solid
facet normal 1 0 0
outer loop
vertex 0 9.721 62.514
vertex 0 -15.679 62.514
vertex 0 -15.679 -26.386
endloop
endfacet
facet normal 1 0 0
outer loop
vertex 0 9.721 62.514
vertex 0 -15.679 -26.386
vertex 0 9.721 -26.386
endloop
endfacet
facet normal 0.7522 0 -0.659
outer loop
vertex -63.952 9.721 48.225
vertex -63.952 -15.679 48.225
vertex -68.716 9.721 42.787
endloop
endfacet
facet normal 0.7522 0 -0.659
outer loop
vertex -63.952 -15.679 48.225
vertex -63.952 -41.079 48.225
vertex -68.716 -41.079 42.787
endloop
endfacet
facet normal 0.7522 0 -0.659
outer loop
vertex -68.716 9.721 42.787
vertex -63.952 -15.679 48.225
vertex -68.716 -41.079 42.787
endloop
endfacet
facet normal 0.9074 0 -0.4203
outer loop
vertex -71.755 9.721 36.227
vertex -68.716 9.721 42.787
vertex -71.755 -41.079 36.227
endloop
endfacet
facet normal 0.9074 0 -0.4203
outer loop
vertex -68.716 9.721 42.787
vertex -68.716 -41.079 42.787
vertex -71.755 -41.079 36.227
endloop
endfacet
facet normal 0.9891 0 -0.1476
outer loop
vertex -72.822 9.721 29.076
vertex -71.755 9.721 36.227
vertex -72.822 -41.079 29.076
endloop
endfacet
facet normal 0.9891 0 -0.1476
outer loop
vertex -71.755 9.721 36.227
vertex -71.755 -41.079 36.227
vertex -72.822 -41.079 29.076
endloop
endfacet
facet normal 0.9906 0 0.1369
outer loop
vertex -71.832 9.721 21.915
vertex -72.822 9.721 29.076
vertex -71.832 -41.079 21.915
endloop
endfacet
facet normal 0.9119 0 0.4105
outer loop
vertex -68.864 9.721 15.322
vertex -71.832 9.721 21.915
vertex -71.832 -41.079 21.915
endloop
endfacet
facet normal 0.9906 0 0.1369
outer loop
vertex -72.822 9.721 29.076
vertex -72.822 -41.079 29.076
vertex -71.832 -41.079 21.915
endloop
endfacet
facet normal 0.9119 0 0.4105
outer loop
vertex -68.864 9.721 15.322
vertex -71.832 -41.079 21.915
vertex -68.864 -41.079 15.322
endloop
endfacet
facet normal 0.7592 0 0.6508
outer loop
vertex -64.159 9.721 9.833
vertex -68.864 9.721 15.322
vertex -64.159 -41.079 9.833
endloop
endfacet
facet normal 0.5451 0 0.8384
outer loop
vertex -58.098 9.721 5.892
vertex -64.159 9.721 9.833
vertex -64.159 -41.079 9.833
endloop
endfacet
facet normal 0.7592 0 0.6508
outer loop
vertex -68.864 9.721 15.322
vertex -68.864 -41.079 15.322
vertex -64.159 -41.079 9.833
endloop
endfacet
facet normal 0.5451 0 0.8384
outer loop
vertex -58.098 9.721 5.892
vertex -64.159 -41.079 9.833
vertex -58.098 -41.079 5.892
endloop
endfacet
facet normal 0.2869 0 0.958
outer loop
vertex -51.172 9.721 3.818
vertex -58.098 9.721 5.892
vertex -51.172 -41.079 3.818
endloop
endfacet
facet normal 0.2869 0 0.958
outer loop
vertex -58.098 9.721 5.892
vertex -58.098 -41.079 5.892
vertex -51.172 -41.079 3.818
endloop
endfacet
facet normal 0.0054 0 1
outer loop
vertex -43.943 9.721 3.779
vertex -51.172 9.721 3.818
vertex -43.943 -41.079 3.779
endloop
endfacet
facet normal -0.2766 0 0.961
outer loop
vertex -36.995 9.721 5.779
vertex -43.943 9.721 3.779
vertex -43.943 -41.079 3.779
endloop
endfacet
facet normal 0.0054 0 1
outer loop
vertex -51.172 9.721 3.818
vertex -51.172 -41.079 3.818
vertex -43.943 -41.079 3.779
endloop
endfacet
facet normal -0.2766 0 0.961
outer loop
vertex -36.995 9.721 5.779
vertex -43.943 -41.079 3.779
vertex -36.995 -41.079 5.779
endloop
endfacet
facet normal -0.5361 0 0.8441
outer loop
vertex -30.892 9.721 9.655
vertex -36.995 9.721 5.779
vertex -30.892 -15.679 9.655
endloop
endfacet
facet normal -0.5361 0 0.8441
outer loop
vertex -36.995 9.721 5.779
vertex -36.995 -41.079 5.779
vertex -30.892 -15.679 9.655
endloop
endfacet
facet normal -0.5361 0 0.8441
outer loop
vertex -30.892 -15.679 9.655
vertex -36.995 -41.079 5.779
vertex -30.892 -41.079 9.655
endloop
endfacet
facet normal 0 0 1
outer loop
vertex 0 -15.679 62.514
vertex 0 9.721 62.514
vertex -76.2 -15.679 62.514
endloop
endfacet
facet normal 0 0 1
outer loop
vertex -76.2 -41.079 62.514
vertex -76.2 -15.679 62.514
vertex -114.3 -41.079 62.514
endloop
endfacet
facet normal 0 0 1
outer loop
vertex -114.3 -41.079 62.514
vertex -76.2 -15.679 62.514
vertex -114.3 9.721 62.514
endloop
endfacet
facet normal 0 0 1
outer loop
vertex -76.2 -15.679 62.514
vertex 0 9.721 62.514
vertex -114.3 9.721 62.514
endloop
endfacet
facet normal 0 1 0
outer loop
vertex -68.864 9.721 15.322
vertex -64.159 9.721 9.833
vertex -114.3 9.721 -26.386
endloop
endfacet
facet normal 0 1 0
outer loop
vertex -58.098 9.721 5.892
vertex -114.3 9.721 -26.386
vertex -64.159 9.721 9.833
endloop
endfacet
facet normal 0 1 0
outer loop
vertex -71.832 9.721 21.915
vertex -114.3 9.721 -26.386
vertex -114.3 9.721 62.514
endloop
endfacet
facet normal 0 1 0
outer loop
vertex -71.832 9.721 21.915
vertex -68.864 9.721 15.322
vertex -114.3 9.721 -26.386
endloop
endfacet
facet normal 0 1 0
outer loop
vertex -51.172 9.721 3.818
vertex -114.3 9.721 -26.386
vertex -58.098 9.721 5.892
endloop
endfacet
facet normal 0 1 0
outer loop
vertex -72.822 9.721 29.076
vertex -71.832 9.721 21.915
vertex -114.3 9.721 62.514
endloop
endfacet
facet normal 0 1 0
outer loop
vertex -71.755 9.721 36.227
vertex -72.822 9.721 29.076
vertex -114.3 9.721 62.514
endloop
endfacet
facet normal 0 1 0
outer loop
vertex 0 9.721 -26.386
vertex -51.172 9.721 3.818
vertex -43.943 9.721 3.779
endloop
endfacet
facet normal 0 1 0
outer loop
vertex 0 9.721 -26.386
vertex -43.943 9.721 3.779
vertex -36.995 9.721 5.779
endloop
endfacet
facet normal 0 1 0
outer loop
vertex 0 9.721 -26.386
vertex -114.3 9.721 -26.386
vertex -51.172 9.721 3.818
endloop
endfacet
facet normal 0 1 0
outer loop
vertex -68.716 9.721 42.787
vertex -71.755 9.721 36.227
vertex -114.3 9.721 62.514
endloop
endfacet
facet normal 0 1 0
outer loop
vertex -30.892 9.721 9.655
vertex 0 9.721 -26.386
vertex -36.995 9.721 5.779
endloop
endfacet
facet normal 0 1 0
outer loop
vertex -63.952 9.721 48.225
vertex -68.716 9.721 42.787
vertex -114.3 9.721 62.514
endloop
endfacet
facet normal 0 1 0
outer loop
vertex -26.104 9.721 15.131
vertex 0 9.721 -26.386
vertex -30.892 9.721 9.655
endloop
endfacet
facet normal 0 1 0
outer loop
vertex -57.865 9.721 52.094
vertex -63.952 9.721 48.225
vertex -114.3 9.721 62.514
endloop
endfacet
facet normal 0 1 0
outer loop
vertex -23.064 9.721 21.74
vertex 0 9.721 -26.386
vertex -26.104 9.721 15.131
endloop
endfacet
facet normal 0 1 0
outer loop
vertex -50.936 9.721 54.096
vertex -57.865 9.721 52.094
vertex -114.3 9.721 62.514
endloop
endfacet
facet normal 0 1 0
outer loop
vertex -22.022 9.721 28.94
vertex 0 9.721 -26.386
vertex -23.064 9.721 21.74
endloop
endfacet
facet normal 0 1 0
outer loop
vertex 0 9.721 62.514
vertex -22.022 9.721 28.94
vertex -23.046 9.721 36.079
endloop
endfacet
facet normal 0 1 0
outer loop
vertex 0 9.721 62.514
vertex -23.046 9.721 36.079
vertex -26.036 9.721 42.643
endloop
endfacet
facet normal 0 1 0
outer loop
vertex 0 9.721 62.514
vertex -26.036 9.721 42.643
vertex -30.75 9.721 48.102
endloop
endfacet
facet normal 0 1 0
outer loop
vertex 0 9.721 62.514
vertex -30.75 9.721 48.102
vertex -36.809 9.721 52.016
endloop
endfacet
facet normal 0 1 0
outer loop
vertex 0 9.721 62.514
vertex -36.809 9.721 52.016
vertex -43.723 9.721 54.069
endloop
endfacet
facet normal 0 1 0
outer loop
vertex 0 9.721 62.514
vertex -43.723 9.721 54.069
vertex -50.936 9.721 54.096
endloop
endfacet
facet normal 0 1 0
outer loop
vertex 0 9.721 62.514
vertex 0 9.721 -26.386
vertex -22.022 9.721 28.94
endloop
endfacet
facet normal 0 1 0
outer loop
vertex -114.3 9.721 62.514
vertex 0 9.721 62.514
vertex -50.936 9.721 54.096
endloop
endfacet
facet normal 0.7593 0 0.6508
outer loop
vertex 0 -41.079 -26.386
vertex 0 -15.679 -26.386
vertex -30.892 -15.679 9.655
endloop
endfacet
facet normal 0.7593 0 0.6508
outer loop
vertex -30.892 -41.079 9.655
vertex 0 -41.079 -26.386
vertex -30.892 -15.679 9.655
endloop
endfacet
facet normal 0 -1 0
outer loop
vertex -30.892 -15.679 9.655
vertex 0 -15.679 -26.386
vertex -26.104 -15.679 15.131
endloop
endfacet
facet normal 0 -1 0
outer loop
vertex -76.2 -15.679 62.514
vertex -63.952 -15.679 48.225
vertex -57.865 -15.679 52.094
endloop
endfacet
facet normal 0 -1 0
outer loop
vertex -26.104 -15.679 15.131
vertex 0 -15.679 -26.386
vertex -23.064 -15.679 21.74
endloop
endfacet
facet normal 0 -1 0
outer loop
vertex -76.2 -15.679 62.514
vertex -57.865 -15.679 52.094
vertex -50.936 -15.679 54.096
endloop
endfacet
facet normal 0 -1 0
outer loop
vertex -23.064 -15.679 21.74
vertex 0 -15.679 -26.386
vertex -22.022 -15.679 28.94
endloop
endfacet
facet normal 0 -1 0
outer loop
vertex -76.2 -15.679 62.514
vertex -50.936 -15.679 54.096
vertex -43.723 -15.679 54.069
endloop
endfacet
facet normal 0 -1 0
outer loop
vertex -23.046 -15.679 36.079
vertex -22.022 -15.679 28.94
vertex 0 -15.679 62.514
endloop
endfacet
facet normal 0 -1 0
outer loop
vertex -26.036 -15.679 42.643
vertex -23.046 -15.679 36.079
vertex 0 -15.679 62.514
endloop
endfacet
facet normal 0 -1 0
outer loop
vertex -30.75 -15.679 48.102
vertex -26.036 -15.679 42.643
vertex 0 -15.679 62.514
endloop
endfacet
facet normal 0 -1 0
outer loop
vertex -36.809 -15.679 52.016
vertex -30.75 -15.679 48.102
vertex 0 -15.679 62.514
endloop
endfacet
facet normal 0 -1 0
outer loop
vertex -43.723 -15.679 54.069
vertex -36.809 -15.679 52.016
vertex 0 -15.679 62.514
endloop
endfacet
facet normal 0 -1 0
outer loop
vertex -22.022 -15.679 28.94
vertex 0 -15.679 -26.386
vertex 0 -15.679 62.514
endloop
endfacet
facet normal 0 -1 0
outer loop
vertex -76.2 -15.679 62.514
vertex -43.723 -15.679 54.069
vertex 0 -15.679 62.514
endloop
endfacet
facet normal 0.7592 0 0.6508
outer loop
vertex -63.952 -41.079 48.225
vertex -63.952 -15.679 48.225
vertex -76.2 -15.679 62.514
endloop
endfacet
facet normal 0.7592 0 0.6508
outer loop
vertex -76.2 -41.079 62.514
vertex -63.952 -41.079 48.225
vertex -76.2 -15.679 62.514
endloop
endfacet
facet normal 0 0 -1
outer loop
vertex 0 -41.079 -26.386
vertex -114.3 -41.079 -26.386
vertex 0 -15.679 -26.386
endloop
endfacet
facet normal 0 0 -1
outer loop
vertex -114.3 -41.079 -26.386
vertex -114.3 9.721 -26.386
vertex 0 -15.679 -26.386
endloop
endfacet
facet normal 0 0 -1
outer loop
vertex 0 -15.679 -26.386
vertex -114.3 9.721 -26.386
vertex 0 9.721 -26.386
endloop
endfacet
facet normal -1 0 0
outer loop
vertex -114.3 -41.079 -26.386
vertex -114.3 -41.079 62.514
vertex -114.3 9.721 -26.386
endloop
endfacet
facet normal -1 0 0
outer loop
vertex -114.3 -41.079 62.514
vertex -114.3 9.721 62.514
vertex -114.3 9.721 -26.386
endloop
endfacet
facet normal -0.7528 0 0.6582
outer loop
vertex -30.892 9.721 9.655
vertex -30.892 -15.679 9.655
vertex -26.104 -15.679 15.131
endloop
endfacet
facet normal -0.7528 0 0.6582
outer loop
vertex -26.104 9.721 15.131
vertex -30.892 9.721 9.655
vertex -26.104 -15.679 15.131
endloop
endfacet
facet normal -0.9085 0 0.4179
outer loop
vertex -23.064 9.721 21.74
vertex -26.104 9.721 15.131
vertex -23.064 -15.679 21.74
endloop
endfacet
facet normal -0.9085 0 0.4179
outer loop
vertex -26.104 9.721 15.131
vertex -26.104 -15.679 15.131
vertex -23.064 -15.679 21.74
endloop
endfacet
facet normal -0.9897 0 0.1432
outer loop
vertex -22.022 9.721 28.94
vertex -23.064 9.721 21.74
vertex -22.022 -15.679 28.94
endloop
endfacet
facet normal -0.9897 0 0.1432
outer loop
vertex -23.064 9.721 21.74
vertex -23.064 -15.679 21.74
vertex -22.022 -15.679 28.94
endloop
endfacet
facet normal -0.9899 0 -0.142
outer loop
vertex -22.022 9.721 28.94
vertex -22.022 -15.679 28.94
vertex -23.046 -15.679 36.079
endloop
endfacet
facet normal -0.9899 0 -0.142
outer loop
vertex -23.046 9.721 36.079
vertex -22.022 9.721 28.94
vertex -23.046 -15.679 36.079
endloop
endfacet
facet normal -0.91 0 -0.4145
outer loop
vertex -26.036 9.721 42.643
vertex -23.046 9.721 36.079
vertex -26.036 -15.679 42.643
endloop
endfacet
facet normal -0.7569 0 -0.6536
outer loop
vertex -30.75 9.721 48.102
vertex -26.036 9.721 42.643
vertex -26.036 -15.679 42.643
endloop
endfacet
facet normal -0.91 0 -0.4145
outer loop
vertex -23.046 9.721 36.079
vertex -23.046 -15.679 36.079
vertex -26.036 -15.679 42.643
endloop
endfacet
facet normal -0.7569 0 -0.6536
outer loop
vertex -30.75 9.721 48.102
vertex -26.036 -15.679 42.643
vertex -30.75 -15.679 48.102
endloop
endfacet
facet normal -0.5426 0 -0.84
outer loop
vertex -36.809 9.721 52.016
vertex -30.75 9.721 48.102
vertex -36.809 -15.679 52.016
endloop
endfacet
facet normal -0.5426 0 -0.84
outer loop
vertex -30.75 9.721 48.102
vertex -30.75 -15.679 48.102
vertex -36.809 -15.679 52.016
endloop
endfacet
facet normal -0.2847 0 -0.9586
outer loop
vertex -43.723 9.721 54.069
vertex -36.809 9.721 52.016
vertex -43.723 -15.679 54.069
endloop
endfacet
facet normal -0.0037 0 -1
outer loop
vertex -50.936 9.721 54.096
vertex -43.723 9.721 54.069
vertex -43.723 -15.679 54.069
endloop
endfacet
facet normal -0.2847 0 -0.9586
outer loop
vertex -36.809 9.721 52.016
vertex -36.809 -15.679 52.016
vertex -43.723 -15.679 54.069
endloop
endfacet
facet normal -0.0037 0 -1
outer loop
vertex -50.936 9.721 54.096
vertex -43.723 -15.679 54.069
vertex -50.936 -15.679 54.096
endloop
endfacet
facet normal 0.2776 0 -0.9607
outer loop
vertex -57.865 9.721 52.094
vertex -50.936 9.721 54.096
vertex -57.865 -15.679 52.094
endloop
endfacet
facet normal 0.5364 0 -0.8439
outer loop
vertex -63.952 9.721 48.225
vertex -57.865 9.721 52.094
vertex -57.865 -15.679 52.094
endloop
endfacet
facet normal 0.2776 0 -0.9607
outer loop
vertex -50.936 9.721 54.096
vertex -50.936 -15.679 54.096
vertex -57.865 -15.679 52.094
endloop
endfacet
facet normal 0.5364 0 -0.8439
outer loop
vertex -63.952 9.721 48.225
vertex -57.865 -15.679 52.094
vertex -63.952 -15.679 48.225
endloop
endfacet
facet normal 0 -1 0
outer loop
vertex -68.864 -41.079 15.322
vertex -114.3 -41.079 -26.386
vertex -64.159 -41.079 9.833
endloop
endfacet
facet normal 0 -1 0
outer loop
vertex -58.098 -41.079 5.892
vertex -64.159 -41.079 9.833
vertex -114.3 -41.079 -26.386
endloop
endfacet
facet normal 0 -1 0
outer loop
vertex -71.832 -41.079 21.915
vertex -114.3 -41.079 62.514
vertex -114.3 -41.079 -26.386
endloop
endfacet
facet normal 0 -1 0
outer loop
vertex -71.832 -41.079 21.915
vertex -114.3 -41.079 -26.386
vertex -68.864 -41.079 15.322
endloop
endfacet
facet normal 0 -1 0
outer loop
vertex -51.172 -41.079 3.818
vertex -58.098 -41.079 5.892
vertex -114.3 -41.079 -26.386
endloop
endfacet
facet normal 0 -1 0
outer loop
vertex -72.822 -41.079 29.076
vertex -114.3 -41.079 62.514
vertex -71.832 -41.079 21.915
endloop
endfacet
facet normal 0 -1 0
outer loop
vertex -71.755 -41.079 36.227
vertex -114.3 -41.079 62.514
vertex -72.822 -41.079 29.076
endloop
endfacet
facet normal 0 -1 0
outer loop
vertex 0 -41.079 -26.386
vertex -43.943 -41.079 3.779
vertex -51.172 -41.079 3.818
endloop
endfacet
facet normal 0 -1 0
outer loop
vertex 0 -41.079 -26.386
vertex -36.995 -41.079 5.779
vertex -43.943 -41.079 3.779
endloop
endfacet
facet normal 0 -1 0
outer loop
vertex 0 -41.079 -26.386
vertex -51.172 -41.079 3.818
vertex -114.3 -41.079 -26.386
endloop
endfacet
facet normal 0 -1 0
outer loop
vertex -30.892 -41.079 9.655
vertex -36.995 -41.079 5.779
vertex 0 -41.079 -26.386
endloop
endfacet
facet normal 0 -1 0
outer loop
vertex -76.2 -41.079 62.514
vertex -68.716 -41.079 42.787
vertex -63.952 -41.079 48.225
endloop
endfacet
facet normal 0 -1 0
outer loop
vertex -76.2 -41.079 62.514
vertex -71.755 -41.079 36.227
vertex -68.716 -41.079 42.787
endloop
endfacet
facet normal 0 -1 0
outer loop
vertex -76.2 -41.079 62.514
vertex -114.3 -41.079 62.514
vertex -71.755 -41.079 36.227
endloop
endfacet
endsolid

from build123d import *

# Parameters (mm, degrees)
F0_W     = 25.4
F0_H     = 88.9
F1_DEPTH = 114.3
F3_DEPTH = 25.4
F5_DEPTH = 50.801


with BuildPart() as f1:
    # F0 (on Right) → F1 (new body)
    with BuildSketch(Plane.YZ):
        with Locations((-2.9790955596, 18.0637241125)):
            Rectangle(F0_W, F0_H)
    extrude(amount=-F1_DEPTH)

    # F2 (on face) → F3 (join)
    with BuildSketch(Plane.XZ.offset(15.6790955596)):
        Polygon((-76.2, 62.5137241125), (-114.3, 62.5137241125), (-114.3, -26.3862758875), (0, -26.3862758875), align=None)
    extrude(amount=F3_DEPTH)

    # F4 (on face) → F5 (cut, through all)
    with BuildSketch(Plane.XZ.offset(41.0790955596)):
        with BuildLine():
            Line((-30.8922379172, 9.6546683493), (-63.9524396888, 48.2249037495))
            ThreePointArc((-63.9524396888, 48.2249037495), (-66.7074565031, 12.4096851636), (-30.8922379172, 9.6546683493))
        make_face()
        with BuildLine():
            ThreePointArc((-30.8922379172, 9.6546683493), (-24.3461111813, 18.3262230873), (-22.022338803, 28.9397860494))
            ThreePointArc((-22.022338803, 28.9397860494), (-36.8087758409, 52.0160136711), (-63.9524396888, 48.2249037495))
            Line((-63.9524396888, 48.2249037495), (-30.8922379172, 9.6546683493))
        make_face()
    extrude(amount=-F5_DEPTH, mode=Mode.SUBTRACT)


solid = f1.part
